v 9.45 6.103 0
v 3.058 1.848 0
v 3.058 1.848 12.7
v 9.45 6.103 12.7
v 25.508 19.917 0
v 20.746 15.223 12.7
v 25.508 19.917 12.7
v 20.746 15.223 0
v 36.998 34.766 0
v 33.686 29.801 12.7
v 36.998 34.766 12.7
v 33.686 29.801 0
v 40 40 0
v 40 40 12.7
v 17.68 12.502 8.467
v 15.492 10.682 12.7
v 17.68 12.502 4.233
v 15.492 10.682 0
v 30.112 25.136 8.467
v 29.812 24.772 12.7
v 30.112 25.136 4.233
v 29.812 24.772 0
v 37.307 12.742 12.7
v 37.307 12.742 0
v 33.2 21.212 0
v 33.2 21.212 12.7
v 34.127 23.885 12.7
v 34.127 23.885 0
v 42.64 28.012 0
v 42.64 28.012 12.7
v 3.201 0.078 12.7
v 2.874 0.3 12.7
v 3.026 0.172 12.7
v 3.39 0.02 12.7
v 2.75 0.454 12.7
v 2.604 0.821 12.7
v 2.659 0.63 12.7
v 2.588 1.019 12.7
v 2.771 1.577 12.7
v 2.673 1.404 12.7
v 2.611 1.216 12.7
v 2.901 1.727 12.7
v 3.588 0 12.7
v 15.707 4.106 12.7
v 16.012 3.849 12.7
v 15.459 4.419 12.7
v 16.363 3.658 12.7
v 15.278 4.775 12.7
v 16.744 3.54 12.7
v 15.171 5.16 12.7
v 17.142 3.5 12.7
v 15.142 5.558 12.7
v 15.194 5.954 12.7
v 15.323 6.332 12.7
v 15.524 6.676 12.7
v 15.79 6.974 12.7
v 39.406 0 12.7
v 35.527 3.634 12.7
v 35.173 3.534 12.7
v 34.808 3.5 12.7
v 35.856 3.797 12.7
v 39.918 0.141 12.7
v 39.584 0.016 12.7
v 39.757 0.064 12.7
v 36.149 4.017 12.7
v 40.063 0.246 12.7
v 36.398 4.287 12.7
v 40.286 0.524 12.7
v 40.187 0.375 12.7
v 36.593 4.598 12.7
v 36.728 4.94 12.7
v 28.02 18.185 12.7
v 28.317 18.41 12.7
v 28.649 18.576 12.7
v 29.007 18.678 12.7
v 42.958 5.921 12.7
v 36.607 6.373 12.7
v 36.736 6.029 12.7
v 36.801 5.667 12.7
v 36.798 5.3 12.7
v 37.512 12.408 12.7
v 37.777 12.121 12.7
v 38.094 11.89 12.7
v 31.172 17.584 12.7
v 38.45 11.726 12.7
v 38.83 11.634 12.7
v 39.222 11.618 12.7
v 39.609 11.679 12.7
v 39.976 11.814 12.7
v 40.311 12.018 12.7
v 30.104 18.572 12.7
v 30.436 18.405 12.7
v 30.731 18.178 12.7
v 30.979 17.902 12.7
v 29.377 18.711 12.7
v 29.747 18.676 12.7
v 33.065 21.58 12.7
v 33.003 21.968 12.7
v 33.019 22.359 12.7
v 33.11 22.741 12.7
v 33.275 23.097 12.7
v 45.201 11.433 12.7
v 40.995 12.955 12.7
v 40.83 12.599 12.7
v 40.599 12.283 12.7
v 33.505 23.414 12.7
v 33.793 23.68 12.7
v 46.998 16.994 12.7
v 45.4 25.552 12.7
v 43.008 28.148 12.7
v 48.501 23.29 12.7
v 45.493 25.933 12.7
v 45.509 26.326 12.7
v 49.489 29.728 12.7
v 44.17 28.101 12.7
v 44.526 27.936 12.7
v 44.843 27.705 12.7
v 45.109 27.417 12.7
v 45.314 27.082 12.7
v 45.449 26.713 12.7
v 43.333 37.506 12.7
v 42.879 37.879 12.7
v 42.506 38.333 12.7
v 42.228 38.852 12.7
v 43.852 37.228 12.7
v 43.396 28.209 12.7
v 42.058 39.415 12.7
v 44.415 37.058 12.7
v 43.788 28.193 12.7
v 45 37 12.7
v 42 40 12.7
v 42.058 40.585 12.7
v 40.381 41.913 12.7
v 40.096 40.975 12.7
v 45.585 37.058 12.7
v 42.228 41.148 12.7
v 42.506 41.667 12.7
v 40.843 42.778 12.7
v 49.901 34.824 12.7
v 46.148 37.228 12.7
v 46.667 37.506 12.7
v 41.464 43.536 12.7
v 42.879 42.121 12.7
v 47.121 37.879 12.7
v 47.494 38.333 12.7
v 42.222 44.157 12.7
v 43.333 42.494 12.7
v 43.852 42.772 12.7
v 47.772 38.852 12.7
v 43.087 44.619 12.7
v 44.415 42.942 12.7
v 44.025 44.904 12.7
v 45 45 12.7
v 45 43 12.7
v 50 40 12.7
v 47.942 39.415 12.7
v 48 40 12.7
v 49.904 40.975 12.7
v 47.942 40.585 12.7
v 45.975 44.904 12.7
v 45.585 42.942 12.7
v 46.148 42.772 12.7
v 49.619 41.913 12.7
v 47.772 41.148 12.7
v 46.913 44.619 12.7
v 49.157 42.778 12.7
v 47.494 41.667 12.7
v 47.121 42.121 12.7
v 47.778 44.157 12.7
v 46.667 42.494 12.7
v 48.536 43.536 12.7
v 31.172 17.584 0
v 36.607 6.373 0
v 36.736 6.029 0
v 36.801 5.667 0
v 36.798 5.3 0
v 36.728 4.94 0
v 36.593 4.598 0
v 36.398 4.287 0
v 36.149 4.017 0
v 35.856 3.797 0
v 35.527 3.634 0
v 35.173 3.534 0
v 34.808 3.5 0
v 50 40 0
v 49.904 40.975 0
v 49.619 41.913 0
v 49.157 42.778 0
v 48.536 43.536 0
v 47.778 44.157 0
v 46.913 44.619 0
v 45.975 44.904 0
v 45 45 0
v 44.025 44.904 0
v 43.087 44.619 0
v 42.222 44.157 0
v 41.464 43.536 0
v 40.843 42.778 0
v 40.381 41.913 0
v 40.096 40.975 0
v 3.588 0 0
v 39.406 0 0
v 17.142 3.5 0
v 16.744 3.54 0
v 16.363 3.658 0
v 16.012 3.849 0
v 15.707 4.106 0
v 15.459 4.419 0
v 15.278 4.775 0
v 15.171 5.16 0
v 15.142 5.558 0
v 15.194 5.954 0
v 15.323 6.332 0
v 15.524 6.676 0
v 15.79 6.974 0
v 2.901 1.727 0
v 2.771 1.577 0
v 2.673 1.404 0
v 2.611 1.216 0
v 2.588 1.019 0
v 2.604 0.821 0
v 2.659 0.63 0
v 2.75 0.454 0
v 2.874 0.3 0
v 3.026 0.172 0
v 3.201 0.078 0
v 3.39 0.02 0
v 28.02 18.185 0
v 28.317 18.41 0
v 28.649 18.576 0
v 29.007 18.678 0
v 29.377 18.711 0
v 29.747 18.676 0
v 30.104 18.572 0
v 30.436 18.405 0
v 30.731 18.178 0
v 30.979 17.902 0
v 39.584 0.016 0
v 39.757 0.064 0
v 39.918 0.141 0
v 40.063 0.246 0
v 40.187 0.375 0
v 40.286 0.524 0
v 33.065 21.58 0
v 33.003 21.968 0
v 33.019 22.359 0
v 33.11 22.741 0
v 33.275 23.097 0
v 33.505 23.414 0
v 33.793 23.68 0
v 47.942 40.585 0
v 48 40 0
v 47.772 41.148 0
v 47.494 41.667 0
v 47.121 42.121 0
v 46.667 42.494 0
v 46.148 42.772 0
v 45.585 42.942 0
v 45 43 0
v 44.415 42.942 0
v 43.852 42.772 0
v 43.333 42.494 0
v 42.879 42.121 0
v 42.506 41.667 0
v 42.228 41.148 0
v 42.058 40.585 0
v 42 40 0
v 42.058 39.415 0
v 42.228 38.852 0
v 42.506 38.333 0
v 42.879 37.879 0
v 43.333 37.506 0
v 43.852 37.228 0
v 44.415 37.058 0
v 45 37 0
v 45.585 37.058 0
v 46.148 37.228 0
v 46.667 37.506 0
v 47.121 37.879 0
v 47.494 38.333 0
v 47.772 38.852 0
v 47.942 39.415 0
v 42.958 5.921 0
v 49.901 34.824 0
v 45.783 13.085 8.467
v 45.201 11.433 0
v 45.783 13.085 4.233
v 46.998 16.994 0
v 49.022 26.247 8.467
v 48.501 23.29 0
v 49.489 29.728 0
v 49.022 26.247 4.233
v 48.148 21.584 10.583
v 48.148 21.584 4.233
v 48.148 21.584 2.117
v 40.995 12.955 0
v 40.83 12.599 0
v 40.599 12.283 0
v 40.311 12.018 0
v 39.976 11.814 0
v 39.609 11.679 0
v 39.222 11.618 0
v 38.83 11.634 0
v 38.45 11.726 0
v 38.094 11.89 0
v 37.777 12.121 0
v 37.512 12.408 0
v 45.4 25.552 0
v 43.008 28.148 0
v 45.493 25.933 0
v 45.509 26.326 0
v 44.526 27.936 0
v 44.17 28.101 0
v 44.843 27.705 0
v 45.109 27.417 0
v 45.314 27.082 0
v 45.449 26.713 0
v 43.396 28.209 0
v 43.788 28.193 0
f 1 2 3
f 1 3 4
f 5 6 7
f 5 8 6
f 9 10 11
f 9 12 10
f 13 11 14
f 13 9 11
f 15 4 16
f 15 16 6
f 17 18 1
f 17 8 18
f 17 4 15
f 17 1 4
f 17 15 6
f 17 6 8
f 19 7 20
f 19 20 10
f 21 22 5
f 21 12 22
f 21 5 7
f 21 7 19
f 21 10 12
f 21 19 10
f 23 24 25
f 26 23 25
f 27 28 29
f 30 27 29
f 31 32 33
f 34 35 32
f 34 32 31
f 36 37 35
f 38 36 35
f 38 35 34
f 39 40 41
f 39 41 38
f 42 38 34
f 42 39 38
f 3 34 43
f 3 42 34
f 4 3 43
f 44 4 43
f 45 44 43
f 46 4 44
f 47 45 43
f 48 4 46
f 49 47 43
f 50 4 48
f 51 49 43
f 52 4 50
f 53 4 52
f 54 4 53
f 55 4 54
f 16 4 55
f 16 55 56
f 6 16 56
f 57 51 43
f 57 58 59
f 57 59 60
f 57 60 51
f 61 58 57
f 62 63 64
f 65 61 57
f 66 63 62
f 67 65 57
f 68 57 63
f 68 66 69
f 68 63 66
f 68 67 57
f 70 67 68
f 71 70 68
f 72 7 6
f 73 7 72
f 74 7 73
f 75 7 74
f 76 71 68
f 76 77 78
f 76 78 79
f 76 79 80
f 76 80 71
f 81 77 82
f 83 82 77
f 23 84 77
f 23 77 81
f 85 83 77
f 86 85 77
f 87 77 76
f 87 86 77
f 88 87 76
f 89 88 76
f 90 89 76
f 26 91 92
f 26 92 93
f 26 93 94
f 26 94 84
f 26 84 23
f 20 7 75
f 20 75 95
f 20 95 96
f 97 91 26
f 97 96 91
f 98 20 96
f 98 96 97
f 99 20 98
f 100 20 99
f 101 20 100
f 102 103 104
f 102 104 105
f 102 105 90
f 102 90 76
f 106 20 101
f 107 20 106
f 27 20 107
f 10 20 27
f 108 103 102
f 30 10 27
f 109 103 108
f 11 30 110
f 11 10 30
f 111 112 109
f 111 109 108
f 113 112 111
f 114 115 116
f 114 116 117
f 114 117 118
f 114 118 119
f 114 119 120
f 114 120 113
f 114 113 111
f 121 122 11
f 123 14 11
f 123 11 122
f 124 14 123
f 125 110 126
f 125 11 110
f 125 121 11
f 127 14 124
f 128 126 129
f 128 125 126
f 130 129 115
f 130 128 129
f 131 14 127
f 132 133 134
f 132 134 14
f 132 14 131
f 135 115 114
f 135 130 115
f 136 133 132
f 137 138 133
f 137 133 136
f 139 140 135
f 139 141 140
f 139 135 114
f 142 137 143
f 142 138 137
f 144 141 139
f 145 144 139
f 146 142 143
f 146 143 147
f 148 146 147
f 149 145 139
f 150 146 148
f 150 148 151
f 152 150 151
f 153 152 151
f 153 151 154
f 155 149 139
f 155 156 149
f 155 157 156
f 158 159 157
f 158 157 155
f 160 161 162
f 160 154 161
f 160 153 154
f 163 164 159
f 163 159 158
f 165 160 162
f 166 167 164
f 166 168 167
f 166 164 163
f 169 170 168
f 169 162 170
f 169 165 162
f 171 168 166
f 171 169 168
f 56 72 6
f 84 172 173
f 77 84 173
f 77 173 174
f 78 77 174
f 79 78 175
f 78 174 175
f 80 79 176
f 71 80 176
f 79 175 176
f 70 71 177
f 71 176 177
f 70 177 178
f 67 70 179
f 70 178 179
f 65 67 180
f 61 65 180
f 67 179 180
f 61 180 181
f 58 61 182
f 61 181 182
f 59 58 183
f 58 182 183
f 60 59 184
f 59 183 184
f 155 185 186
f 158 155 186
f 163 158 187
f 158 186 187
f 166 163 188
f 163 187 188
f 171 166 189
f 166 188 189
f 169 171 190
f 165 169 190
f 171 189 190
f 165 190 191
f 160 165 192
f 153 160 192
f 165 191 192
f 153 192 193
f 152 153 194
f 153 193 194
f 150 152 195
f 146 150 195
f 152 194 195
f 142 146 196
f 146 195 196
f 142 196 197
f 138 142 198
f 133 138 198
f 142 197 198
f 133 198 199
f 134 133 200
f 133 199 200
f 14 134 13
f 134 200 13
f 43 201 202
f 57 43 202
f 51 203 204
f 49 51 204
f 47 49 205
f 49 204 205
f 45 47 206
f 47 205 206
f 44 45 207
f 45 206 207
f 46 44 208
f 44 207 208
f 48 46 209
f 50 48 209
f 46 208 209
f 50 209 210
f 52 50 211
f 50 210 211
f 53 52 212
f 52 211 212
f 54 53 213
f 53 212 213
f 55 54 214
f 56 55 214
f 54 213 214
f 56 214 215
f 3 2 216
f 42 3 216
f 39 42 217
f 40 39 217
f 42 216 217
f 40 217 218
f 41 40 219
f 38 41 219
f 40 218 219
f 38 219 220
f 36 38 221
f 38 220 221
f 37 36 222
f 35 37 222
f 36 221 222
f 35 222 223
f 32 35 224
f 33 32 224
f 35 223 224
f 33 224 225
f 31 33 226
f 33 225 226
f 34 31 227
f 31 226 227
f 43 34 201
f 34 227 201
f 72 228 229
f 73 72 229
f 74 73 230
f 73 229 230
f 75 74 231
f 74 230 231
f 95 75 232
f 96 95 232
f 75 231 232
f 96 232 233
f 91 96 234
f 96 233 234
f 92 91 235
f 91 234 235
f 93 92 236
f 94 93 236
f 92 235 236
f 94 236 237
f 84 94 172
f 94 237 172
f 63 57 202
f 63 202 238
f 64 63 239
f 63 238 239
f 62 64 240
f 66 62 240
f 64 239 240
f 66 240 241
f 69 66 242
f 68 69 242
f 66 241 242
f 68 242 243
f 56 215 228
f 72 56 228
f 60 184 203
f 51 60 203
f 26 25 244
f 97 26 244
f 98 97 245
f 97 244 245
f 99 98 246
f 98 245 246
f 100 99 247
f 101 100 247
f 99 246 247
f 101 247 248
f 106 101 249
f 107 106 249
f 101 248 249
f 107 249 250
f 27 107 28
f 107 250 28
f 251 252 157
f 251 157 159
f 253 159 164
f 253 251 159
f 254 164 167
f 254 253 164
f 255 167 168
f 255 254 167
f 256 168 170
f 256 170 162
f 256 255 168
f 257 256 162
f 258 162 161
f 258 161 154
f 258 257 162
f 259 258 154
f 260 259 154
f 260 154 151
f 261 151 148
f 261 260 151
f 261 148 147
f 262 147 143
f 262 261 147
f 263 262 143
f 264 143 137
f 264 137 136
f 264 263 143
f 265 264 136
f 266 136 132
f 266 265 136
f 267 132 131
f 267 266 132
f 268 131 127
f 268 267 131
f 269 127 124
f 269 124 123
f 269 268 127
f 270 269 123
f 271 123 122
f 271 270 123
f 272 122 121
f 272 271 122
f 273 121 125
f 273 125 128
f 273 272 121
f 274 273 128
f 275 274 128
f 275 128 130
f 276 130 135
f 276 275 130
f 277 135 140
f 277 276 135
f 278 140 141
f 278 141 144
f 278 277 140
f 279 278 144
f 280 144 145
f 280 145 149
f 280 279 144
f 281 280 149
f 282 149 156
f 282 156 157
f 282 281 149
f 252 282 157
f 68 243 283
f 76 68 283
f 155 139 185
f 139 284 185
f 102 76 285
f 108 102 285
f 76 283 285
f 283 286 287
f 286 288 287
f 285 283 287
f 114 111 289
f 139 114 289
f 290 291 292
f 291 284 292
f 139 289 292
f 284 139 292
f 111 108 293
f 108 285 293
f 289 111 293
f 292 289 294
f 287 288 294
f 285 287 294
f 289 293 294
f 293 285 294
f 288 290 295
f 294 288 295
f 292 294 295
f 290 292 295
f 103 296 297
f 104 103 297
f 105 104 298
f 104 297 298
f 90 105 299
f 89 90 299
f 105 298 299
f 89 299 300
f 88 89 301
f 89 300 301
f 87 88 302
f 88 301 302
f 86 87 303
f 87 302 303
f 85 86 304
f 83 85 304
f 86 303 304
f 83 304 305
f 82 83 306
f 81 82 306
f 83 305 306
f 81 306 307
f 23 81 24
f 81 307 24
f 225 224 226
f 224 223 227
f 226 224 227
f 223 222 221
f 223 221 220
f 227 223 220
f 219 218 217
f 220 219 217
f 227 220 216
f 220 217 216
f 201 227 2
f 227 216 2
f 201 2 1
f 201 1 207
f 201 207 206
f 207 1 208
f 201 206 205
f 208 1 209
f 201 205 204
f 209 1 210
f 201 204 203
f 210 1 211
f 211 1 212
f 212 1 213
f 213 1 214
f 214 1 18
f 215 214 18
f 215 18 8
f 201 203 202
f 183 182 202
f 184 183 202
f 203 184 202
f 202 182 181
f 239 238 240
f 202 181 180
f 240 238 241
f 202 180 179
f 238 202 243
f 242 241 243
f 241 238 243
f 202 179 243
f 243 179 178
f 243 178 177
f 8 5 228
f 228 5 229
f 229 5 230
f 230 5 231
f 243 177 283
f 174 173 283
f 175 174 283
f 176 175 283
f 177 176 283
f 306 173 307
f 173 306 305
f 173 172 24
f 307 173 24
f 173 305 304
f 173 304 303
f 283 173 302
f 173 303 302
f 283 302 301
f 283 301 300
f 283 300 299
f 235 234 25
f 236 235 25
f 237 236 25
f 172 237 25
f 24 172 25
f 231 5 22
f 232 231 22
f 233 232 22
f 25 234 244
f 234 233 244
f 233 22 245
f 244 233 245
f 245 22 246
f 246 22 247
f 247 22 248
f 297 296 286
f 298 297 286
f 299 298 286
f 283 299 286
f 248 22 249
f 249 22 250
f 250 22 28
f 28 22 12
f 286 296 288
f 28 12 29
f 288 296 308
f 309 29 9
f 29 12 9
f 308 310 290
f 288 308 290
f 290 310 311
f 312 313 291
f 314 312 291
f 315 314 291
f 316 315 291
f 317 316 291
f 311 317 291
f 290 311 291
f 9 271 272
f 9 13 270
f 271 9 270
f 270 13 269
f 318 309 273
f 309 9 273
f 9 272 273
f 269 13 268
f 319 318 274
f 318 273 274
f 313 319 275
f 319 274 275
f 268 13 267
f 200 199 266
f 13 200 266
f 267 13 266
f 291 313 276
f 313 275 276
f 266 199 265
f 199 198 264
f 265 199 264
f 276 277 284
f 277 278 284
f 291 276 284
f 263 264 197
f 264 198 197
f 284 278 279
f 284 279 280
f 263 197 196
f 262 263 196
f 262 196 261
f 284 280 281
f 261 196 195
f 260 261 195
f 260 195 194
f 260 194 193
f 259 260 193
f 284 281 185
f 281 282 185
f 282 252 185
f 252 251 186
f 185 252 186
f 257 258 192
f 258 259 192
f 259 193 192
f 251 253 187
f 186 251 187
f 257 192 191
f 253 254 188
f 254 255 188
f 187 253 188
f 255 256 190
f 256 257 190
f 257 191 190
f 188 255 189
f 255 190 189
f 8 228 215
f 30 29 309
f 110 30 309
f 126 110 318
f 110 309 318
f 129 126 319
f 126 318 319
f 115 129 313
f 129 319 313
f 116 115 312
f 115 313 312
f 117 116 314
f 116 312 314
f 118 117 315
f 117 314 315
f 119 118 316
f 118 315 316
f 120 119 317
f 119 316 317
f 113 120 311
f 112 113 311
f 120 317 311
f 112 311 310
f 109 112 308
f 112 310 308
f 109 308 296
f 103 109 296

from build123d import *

# Parameters (mm, degrees)
CROQUIS2_R              = 3
SALIENTE_EXTRUIR1_DEPTH = 12.7


with BuildPart() as part:
    # Croquis2 → Saliente-Extruir1 (new body)
    with BuildSketch(Plane.XY):
        with BuildLine():
            Line((3.587738838, 0), (39.406158703, 0))
            ThreePointArc((39.406158703, 0), (39.918259557, 0.141074674), (40.285871489, 0.524494569))
            add(Edge.make_bspline(
                [(40.285871489, 0.524494569), (46.911013433, 12.781393637), (50.153045093, 25.954013269), (50, 40)],
                knots=[0.014077908, 0.014077908, 0.014077908, 0.014077908, 1, 1, 1, 1], degree=3))
            ThreePointArc((50, 40), (45, 45), (40, 40))
            add(Edge.make_bspline(
                [(3.057834867, 1.848057652), (18.658480945, 11.5960321), (31.500499666, 23.937674405), (40, 40)],
                knots=[0.060556777, 0.060556777, 0.060556777, 0.060556777, 1, 1, 1, 1], degree=3))
            ThreePointArc((3.057834867, 1.848057652), (2.626474657, 0.724371311), (3.587738838, 0))
        make_face()
        with Locations((45, 40)):
            Circle(CROQUIS2_R, mode=Mode.SUBTRACT)
        with BuildLine():
            Line((15.790154488, 6.97430828), (28.020474624, 18.185435072))
            ThreePointArc((28.020474624, 18.185435072), (29.74708418, 18.675625391), (31.171552095, 17.583673804))
            Line((31.171552095, 17.583673804), (36.607249933, 6.372547013))
            ThreePointArc((36.607249933, 6.372547013), (36.502480714, 4.438184109), (34.807621719, 3.5))
            Line((34.807621719, 3.5), (17.141603745, 3.5))
            ThreePointArc((17.141603745, 3.5), (15.277654099, 4.774953988), (15.790154488, 6.97430828))
        make_face(mode=Mode.SUBTRACT)
        with BuildLine():
            Line((37.307061828, 12.742351686), (33.200366798, 21.212410186))
            ThreePointArc((33.200366798, 21.212410186), (33.110481788, 22.740502603), (34.127447999, 23.884585413))
            Line((34.127447999, 23.884585413), (42.639921091, 28.011845094))
            ThreePointArc((42.639921091, 28.011845094), (44.843064134, 27.705372666), (45.400338187, 25.551954395))
            Line((45.400338187, 25.551954395), (40.994560126, 12.954636215))
            ThreePointArc((40.994560126, 12.954636215), (39.221637148, 11.61820464), (37.307061828, 12.742351686))
        make_face(mode=Mode.SUBTRACT)
    extrude(amount=SALIENTE_EXTRUIR1_DEPTH)


solid = part.part
